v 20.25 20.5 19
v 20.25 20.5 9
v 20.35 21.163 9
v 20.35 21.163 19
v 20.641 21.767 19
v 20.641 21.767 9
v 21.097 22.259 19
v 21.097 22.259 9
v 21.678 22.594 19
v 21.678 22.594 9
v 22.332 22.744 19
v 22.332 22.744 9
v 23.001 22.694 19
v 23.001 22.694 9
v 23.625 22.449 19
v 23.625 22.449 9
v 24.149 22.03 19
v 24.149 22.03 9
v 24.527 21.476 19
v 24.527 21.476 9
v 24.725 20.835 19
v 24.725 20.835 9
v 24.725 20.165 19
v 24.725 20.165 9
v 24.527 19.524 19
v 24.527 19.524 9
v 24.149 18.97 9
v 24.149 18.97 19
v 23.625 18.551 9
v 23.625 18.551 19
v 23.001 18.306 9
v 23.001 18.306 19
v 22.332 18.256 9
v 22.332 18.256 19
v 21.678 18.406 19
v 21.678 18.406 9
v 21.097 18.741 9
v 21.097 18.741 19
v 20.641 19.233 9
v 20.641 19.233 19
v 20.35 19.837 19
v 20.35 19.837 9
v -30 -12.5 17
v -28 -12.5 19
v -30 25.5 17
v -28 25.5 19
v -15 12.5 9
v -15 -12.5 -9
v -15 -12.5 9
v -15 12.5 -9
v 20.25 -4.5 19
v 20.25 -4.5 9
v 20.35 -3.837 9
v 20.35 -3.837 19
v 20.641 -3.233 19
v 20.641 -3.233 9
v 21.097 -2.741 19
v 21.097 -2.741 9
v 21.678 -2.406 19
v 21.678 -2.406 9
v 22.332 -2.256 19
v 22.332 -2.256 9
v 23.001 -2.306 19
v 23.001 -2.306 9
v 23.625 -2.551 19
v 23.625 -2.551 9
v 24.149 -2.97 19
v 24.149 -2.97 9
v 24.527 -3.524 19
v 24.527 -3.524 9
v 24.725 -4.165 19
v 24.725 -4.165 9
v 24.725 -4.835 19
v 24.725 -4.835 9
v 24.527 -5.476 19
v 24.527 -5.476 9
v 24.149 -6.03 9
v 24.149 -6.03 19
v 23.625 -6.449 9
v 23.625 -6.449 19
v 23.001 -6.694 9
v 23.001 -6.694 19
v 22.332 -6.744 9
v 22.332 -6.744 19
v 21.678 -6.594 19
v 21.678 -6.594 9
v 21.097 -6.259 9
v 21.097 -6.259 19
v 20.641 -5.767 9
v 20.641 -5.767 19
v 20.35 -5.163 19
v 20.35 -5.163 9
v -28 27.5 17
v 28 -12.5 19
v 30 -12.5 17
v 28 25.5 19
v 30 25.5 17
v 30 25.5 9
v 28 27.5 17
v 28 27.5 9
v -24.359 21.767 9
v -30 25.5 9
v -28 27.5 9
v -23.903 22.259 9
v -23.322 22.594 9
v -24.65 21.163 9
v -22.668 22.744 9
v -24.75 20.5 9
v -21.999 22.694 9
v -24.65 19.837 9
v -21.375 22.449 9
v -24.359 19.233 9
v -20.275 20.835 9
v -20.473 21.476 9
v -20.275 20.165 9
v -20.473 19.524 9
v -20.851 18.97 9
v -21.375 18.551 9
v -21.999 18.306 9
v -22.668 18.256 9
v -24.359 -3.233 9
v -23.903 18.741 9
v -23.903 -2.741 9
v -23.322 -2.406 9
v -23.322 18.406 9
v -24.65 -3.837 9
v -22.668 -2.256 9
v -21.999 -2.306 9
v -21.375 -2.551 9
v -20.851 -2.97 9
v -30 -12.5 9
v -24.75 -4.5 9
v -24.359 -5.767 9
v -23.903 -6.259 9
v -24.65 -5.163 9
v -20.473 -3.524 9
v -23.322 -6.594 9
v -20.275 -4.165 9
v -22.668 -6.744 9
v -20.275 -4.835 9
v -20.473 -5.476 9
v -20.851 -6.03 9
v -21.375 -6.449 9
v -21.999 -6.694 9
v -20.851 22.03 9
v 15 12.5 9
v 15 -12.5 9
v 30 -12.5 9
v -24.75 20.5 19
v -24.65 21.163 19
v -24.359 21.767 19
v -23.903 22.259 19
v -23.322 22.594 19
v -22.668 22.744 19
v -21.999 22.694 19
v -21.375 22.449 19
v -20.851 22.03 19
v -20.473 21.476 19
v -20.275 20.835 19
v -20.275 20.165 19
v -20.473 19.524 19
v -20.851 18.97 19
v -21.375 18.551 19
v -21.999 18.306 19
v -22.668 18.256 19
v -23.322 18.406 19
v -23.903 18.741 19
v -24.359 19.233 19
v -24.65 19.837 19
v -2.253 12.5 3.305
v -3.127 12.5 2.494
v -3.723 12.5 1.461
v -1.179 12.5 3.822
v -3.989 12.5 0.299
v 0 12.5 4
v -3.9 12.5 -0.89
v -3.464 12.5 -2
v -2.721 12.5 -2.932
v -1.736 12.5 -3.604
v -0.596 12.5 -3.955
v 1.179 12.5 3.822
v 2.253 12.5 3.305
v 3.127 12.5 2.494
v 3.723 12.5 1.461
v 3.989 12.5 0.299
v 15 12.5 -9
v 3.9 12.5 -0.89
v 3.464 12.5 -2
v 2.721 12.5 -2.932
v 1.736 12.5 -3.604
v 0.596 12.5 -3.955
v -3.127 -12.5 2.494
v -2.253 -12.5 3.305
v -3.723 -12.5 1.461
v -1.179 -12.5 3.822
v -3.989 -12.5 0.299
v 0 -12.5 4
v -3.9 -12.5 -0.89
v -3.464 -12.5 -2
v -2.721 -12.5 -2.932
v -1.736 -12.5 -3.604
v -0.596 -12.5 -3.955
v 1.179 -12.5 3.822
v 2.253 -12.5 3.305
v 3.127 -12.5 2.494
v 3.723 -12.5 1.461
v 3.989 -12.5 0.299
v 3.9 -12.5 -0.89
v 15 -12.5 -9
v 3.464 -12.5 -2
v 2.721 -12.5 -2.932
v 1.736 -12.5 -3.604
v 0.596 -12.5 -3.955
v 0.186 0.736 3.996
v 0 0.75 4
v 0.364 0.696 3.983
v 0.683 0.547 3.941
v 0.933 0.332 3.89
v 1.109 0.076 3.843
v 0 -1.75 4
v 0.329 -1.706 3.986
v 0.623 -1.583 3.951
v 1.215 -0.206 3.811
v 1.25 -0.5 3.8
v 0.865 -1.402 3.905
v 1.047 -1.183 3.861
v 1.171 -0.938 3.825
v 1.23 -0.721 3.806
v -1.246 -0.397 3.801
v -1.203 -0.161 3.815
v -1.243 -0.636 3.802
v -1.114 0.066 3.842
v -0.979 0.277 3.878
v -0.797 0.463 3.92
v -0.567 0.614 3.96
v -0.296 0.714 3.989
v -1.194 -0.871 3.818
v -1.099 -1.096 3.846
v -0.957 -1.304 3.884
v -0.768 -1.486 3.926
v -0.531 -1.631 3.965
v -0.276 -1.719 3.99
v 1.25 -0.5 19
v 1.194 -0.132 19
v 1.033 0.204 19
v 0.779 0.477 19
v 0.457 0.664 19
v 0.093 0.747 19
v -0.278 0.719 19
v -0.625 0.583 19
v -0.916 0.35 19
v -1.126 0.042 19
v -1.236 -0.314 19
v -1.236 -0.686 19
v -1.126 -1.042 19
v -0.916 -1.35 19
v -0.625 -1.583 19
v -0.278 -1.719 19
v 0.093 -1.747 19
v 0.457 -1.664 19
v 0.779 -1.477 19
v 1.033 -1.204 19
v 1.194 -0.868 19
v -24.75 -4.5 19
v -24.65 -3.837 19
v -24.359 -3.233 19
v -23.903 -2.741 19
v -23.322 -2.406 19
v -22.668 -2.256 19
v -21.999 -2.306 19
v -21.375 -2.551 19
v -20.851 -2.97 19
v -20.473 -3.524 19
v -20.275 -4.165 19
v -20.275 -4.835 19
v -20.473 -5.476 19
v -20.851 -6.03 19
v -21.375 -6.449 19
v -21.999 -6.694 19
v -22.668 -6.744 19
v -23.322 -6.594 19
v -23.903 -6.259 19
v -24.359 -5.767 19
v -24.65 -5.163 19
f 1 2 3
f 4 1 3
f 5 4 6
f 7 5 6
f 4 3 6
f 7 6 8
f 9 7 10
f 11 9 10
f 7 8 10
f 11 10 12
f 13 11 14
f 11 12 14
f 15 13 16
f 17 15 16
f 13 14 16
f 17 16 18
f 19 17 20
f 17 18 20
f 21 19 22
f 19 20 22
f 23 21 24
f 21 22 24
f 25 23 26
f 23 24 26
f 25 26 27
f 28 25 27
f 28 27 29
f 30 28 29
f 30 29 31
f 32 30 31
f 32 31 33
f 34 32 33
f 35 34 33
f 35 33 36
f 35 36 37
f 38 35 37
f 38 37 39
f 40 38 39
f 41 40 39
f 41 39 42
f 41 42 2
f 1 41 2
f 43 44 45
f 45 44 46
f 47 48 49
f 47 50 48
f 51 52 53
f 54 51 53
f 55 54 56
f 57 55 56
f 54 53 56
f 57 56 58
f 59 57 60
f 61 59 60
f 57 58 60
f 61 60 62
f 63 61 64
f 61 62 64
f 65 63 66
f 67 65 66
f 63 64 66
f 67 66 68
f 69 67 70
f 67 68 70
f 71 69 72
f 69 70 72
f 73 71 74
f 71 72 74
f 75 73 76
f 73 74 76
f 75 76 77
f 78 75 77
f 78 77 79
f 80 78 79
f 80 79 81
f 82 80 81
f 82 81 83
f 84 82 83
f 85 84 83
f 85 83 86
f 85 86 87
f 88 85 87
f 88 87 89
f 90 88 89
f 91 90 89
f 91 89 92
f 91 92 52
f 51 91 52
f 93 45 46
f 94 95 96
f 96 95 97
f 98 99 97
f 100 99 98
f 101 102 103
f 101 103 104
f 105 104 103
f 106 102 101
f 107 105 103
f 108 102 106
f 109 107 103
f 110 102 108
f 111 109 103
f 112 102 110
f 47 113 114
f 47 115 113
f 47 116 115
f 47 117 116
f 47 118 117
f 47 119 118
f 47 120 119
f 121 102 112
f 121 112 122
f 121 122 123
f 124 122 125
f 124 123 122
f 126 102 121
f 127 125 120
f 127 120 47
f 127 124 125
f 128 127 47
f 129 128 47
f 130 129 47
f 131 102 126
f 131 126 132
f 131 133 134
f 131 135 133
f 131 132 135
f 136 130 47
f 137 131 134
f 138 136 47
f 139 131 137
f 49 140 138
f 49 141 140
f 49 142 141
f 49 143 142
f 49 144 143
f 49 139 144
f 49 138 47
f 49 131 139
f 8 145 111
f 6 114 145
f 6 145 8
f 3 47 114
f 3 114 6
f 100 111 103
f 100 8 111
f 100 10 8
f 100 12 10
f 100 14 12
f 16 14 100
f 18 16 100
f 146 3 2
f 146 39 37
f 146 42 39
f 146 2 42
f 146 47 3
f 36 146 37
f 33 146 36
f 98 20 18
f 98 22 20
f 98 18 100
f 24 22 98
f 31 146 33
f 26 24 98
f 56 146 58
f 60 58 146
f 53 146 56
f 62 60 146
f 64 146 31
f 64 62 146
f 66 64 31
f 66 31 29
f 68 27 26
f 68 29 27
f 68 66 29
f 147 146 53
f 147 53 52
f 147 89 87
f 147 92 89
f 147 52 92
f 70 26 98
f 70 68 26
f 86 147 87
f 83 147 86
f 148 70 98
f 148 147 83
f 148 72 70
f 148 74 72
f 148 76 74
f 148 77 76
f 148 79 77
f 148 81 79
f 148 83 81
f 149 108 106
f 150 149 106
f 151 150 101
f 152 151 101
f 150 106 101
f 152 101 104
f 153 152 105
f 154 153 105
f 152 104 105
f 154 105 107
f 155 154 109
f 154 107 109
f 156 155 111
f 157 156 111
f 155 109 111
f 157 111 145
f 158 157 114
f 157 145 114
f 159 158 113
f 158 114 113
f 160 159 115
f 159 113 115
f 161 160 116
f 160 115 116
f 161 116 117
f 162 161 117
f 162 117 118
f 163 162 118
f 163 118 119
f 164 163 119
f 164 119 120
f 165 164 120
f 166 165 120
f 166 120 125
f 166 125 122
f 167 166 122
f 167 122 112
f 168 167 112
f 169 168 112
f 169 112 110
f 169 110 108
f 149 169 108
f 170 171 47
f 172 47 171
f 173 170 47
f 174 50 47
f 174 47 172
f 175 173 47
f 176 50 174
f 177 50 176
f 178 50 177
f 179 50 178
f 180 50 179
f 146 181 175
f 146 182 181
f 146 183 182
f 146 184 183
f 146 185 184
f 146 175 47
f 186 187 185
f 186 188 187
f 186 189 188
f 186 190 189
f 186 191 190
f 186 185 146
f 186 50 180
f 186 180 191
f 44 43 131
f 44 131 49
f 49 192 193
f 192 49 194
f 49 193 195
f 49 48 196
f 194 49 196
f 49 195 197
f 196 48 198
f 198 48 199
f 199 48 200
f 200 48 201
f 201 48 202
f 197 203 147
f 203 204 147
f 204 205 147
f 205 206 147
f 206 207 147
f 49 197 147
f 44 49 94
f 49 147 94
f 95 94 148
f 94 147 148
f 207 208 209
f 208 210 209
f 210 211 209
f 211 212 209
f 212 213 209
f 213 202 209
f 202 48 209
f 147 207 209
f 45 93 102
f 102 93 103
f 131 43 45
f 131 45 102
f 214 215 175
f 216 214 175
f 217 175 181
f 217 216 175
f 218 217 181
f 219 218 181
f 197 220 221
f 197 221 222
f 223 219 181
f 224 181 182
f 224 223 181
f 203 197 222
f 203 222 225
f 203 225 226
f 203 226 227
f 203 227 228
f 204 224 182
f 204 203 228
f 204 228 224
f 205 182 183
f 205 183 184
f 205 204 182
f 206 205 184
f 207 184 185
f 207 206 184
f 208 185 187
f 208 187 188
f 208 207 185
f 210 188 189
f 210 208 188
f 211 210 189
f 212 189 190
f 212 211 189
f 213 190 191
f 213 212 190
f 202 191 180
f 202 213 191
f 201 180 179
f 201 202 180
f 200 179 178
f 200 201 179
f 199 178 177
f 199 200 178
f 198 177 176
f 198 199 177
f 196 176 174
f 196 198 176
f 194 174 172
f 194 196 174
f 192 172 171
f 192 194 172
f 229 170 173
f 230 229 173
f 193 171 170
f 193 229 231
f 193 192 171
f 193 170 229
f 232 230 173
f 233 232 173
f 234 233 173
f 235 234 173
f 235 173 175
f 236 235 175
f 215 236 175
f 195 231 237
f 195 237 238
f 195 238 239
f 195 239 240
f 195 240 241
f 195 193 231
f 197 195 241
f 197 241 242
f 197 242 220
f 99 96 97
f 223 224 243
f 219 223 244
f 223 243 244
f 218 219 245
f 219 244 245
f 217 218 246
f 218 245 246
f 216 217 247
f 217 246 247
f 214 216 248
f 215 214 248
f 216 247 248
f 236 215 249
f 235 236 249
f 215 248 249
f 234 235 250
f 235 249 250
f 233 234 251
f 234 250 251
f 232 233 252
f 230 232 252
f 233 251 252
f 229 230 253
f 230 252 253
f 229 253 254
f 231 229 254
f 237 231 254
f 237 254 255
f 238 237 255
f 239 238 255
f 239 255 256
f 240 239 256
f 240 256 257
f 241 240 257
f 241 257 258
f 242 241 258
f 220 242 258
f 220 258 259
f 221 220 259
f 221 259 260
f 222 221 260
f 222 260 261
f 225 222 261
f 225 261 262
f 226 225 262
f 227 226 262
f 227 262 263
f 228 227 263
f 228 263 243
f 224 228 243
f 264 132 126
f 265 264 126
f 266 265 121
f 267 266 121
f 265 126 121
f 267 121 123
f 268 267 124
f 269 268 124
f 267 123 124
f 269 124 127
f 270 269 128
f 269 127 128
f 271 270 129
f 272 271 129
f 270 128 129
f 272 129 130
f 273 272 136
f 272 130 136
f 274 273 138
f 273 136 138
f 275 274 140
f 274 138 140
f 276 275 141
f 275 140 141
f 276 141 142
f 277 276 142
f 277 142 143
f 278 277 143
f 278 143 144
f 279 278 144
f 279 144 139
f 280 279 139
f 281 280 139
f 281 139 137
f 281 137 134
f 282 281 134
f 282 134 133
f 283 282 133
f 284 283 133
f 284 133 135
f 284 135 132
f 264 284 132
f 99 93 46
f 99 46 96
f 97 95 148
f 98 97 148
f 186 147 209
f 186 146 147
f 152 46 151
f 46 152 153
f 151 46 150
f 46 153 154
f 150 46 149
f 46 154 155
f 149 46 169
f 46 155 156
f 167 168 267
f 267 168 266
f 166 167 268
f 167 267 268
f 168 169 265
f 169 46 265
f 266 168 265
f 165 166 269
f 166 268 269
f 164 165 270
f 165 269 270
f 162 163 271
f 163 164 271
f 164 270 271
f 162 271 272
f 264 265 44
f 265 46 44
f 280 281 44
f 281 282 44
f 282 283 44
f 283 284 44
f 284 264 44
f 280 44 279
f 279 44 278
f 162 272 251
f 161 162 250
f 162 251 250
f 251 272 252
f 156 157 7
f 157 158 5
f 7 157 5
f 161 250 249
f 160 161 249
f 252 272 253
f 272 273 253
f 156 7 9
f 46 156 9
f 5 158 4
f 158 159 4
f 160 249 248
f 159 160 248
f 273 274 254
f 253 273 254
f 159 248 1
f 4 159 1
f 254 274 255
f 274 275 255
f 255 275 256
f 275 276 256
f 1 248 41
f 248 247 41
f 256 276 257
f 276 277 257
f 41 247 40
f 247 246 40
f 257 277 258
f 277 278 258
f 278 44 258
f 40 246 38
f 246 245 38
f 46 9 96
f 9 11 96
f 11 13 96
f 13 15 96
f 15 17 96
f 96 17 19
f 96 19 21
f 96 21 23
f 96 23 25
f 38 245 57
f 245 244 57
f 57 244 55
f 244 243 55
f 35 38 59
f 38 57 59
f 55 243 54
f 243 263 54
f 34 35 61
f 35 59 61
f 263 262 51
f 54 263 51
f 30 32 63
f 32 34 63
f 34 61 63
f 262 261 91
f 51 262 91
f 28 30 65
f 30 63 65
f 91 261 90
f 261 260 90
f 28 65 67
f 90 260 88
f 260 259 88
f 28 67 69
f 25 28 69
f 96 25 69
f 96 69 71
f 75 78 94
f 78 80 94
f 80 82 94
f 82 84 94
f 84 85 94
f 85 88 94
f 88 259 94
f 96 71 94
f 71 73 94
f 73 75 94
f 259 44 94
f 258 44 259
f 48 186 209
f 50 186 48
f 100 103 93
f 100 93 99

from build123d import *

# Parameters (mm, degrees)
SKETCH1_R               = 4
BOSS_EXTRUDE1_DEPTH     = 12.5
SKETCH2_W               = 60
SKETCH2_H               = 10
BOSS_EXTRUDE2_DEPTH     = 15
CHAMFER1_SIZE           = 2
SKETCH3_R               = 2.25
CUT_EXTRUDE1_DEPTH      = 45.5
CUT_EXTRUDE2_REACH      = 51.399
CUT_EXTRUDE2_END_RADIUS = 4
SKETCH4_R               = 1.25


with BuildPart() as part:
    # Sketch1 → Boss-Extrude1 (new, symmetric)
    with BuildSketch(Plane(origin=(0, 0, 0), x_dir=(1, 0, 0), z_dir=(0, 1, 0))):
        Polygon((-15, -9), (-30, -9), (-30, -19), (30, -19), (30, -9), (15, -9), (15, 9), (-15, 9), align=None)
        with Locations(Location((0, 0, 0), (0, 0, 270))):
            Circle(SKETCH1_R, mode=Mode.SUBTRACT)
    extrude(amount=BOSS_EXTRUDE1_DEPTH, both=True)

    # Sketch2 → Boss-Extrude2 (add)
    with BuildSketch(Plane(origin=(0, 12.5, 0), x_dir=(1, 0, 0), z_dir=(0, 1, 0))):
        with Locations((0, -14)):
            Rectangle(SKETCH2_W, SKETCH2_H)
    extrude(amount=BOSS_EXTRUDE2_DEPTH)

    # Chamfer1
    chamfer1_edges = [part.edges().sort_by_distance(p)[0] for p in [
        (30, 7.5, 19),
        (-30, 7.5, 19),
        (-30, 27.5, 14),
        (0, 27.5, 19),
        (30, 27.5, 14),
    ]]
    chamfer(chamfer1_edges, length=CHAMFER1_SIZE)

    # Sketch3 → Cut-Extrude1 (cut, through all)
    with BuildSketch(Plane(origin=(0, 0, 9), x_dir=(-1, 0, 0), z_dir=(0, 0, -1))):
        with Locations((-22.5, 20.5)):
            Circle(SKETCH3_R)
        with Locations((-22.5, -4.5)):
            Circle(SKETCH3_R)
        with Locations((22.5, 20.5)):
            Circle(SKETCH3_R)
        with Locations((22.5, -4.5)):
            Circle(SKETCH3_R)
    extrude(amount=-CUT_EXTRUDE1_DEPTH, mode=Mode.SUBTRACT)

    # Cut-Extrude2: up to this cylinder (the profile starts outside it)
    cut_extrude2_end = Plane(origin=(0, -0.5, 0), z_dir=(0, -1, 0)) * Cylinder(CUT_EXTRUDE2_END_RADIUS, 111.798, mode=Mode.PRIVATE)
    # Sketch4 → Cut-Extrude2 (cut, up to the surface)
    with BuildSketch(Plane.XY.offset(19), mode=Mode.PRIVATE) as cut_extrude2_sk1:
        with Locations((0, -0.5)):
            Circle(SKETCH4_R)
    cut_extrude2_tool1 = extrude(cut_extrude2_sk1.sketch, amount=-CUT_EXTRUDE2_REACH, mode=Mode.PRIVATE) - cut_extrude2_end
    add(cut_extrude2_tool1.solids().sort_by_distance((0, -0.5, 19))[0], mode=Mode.SUBTRACT)


solid = part.part
